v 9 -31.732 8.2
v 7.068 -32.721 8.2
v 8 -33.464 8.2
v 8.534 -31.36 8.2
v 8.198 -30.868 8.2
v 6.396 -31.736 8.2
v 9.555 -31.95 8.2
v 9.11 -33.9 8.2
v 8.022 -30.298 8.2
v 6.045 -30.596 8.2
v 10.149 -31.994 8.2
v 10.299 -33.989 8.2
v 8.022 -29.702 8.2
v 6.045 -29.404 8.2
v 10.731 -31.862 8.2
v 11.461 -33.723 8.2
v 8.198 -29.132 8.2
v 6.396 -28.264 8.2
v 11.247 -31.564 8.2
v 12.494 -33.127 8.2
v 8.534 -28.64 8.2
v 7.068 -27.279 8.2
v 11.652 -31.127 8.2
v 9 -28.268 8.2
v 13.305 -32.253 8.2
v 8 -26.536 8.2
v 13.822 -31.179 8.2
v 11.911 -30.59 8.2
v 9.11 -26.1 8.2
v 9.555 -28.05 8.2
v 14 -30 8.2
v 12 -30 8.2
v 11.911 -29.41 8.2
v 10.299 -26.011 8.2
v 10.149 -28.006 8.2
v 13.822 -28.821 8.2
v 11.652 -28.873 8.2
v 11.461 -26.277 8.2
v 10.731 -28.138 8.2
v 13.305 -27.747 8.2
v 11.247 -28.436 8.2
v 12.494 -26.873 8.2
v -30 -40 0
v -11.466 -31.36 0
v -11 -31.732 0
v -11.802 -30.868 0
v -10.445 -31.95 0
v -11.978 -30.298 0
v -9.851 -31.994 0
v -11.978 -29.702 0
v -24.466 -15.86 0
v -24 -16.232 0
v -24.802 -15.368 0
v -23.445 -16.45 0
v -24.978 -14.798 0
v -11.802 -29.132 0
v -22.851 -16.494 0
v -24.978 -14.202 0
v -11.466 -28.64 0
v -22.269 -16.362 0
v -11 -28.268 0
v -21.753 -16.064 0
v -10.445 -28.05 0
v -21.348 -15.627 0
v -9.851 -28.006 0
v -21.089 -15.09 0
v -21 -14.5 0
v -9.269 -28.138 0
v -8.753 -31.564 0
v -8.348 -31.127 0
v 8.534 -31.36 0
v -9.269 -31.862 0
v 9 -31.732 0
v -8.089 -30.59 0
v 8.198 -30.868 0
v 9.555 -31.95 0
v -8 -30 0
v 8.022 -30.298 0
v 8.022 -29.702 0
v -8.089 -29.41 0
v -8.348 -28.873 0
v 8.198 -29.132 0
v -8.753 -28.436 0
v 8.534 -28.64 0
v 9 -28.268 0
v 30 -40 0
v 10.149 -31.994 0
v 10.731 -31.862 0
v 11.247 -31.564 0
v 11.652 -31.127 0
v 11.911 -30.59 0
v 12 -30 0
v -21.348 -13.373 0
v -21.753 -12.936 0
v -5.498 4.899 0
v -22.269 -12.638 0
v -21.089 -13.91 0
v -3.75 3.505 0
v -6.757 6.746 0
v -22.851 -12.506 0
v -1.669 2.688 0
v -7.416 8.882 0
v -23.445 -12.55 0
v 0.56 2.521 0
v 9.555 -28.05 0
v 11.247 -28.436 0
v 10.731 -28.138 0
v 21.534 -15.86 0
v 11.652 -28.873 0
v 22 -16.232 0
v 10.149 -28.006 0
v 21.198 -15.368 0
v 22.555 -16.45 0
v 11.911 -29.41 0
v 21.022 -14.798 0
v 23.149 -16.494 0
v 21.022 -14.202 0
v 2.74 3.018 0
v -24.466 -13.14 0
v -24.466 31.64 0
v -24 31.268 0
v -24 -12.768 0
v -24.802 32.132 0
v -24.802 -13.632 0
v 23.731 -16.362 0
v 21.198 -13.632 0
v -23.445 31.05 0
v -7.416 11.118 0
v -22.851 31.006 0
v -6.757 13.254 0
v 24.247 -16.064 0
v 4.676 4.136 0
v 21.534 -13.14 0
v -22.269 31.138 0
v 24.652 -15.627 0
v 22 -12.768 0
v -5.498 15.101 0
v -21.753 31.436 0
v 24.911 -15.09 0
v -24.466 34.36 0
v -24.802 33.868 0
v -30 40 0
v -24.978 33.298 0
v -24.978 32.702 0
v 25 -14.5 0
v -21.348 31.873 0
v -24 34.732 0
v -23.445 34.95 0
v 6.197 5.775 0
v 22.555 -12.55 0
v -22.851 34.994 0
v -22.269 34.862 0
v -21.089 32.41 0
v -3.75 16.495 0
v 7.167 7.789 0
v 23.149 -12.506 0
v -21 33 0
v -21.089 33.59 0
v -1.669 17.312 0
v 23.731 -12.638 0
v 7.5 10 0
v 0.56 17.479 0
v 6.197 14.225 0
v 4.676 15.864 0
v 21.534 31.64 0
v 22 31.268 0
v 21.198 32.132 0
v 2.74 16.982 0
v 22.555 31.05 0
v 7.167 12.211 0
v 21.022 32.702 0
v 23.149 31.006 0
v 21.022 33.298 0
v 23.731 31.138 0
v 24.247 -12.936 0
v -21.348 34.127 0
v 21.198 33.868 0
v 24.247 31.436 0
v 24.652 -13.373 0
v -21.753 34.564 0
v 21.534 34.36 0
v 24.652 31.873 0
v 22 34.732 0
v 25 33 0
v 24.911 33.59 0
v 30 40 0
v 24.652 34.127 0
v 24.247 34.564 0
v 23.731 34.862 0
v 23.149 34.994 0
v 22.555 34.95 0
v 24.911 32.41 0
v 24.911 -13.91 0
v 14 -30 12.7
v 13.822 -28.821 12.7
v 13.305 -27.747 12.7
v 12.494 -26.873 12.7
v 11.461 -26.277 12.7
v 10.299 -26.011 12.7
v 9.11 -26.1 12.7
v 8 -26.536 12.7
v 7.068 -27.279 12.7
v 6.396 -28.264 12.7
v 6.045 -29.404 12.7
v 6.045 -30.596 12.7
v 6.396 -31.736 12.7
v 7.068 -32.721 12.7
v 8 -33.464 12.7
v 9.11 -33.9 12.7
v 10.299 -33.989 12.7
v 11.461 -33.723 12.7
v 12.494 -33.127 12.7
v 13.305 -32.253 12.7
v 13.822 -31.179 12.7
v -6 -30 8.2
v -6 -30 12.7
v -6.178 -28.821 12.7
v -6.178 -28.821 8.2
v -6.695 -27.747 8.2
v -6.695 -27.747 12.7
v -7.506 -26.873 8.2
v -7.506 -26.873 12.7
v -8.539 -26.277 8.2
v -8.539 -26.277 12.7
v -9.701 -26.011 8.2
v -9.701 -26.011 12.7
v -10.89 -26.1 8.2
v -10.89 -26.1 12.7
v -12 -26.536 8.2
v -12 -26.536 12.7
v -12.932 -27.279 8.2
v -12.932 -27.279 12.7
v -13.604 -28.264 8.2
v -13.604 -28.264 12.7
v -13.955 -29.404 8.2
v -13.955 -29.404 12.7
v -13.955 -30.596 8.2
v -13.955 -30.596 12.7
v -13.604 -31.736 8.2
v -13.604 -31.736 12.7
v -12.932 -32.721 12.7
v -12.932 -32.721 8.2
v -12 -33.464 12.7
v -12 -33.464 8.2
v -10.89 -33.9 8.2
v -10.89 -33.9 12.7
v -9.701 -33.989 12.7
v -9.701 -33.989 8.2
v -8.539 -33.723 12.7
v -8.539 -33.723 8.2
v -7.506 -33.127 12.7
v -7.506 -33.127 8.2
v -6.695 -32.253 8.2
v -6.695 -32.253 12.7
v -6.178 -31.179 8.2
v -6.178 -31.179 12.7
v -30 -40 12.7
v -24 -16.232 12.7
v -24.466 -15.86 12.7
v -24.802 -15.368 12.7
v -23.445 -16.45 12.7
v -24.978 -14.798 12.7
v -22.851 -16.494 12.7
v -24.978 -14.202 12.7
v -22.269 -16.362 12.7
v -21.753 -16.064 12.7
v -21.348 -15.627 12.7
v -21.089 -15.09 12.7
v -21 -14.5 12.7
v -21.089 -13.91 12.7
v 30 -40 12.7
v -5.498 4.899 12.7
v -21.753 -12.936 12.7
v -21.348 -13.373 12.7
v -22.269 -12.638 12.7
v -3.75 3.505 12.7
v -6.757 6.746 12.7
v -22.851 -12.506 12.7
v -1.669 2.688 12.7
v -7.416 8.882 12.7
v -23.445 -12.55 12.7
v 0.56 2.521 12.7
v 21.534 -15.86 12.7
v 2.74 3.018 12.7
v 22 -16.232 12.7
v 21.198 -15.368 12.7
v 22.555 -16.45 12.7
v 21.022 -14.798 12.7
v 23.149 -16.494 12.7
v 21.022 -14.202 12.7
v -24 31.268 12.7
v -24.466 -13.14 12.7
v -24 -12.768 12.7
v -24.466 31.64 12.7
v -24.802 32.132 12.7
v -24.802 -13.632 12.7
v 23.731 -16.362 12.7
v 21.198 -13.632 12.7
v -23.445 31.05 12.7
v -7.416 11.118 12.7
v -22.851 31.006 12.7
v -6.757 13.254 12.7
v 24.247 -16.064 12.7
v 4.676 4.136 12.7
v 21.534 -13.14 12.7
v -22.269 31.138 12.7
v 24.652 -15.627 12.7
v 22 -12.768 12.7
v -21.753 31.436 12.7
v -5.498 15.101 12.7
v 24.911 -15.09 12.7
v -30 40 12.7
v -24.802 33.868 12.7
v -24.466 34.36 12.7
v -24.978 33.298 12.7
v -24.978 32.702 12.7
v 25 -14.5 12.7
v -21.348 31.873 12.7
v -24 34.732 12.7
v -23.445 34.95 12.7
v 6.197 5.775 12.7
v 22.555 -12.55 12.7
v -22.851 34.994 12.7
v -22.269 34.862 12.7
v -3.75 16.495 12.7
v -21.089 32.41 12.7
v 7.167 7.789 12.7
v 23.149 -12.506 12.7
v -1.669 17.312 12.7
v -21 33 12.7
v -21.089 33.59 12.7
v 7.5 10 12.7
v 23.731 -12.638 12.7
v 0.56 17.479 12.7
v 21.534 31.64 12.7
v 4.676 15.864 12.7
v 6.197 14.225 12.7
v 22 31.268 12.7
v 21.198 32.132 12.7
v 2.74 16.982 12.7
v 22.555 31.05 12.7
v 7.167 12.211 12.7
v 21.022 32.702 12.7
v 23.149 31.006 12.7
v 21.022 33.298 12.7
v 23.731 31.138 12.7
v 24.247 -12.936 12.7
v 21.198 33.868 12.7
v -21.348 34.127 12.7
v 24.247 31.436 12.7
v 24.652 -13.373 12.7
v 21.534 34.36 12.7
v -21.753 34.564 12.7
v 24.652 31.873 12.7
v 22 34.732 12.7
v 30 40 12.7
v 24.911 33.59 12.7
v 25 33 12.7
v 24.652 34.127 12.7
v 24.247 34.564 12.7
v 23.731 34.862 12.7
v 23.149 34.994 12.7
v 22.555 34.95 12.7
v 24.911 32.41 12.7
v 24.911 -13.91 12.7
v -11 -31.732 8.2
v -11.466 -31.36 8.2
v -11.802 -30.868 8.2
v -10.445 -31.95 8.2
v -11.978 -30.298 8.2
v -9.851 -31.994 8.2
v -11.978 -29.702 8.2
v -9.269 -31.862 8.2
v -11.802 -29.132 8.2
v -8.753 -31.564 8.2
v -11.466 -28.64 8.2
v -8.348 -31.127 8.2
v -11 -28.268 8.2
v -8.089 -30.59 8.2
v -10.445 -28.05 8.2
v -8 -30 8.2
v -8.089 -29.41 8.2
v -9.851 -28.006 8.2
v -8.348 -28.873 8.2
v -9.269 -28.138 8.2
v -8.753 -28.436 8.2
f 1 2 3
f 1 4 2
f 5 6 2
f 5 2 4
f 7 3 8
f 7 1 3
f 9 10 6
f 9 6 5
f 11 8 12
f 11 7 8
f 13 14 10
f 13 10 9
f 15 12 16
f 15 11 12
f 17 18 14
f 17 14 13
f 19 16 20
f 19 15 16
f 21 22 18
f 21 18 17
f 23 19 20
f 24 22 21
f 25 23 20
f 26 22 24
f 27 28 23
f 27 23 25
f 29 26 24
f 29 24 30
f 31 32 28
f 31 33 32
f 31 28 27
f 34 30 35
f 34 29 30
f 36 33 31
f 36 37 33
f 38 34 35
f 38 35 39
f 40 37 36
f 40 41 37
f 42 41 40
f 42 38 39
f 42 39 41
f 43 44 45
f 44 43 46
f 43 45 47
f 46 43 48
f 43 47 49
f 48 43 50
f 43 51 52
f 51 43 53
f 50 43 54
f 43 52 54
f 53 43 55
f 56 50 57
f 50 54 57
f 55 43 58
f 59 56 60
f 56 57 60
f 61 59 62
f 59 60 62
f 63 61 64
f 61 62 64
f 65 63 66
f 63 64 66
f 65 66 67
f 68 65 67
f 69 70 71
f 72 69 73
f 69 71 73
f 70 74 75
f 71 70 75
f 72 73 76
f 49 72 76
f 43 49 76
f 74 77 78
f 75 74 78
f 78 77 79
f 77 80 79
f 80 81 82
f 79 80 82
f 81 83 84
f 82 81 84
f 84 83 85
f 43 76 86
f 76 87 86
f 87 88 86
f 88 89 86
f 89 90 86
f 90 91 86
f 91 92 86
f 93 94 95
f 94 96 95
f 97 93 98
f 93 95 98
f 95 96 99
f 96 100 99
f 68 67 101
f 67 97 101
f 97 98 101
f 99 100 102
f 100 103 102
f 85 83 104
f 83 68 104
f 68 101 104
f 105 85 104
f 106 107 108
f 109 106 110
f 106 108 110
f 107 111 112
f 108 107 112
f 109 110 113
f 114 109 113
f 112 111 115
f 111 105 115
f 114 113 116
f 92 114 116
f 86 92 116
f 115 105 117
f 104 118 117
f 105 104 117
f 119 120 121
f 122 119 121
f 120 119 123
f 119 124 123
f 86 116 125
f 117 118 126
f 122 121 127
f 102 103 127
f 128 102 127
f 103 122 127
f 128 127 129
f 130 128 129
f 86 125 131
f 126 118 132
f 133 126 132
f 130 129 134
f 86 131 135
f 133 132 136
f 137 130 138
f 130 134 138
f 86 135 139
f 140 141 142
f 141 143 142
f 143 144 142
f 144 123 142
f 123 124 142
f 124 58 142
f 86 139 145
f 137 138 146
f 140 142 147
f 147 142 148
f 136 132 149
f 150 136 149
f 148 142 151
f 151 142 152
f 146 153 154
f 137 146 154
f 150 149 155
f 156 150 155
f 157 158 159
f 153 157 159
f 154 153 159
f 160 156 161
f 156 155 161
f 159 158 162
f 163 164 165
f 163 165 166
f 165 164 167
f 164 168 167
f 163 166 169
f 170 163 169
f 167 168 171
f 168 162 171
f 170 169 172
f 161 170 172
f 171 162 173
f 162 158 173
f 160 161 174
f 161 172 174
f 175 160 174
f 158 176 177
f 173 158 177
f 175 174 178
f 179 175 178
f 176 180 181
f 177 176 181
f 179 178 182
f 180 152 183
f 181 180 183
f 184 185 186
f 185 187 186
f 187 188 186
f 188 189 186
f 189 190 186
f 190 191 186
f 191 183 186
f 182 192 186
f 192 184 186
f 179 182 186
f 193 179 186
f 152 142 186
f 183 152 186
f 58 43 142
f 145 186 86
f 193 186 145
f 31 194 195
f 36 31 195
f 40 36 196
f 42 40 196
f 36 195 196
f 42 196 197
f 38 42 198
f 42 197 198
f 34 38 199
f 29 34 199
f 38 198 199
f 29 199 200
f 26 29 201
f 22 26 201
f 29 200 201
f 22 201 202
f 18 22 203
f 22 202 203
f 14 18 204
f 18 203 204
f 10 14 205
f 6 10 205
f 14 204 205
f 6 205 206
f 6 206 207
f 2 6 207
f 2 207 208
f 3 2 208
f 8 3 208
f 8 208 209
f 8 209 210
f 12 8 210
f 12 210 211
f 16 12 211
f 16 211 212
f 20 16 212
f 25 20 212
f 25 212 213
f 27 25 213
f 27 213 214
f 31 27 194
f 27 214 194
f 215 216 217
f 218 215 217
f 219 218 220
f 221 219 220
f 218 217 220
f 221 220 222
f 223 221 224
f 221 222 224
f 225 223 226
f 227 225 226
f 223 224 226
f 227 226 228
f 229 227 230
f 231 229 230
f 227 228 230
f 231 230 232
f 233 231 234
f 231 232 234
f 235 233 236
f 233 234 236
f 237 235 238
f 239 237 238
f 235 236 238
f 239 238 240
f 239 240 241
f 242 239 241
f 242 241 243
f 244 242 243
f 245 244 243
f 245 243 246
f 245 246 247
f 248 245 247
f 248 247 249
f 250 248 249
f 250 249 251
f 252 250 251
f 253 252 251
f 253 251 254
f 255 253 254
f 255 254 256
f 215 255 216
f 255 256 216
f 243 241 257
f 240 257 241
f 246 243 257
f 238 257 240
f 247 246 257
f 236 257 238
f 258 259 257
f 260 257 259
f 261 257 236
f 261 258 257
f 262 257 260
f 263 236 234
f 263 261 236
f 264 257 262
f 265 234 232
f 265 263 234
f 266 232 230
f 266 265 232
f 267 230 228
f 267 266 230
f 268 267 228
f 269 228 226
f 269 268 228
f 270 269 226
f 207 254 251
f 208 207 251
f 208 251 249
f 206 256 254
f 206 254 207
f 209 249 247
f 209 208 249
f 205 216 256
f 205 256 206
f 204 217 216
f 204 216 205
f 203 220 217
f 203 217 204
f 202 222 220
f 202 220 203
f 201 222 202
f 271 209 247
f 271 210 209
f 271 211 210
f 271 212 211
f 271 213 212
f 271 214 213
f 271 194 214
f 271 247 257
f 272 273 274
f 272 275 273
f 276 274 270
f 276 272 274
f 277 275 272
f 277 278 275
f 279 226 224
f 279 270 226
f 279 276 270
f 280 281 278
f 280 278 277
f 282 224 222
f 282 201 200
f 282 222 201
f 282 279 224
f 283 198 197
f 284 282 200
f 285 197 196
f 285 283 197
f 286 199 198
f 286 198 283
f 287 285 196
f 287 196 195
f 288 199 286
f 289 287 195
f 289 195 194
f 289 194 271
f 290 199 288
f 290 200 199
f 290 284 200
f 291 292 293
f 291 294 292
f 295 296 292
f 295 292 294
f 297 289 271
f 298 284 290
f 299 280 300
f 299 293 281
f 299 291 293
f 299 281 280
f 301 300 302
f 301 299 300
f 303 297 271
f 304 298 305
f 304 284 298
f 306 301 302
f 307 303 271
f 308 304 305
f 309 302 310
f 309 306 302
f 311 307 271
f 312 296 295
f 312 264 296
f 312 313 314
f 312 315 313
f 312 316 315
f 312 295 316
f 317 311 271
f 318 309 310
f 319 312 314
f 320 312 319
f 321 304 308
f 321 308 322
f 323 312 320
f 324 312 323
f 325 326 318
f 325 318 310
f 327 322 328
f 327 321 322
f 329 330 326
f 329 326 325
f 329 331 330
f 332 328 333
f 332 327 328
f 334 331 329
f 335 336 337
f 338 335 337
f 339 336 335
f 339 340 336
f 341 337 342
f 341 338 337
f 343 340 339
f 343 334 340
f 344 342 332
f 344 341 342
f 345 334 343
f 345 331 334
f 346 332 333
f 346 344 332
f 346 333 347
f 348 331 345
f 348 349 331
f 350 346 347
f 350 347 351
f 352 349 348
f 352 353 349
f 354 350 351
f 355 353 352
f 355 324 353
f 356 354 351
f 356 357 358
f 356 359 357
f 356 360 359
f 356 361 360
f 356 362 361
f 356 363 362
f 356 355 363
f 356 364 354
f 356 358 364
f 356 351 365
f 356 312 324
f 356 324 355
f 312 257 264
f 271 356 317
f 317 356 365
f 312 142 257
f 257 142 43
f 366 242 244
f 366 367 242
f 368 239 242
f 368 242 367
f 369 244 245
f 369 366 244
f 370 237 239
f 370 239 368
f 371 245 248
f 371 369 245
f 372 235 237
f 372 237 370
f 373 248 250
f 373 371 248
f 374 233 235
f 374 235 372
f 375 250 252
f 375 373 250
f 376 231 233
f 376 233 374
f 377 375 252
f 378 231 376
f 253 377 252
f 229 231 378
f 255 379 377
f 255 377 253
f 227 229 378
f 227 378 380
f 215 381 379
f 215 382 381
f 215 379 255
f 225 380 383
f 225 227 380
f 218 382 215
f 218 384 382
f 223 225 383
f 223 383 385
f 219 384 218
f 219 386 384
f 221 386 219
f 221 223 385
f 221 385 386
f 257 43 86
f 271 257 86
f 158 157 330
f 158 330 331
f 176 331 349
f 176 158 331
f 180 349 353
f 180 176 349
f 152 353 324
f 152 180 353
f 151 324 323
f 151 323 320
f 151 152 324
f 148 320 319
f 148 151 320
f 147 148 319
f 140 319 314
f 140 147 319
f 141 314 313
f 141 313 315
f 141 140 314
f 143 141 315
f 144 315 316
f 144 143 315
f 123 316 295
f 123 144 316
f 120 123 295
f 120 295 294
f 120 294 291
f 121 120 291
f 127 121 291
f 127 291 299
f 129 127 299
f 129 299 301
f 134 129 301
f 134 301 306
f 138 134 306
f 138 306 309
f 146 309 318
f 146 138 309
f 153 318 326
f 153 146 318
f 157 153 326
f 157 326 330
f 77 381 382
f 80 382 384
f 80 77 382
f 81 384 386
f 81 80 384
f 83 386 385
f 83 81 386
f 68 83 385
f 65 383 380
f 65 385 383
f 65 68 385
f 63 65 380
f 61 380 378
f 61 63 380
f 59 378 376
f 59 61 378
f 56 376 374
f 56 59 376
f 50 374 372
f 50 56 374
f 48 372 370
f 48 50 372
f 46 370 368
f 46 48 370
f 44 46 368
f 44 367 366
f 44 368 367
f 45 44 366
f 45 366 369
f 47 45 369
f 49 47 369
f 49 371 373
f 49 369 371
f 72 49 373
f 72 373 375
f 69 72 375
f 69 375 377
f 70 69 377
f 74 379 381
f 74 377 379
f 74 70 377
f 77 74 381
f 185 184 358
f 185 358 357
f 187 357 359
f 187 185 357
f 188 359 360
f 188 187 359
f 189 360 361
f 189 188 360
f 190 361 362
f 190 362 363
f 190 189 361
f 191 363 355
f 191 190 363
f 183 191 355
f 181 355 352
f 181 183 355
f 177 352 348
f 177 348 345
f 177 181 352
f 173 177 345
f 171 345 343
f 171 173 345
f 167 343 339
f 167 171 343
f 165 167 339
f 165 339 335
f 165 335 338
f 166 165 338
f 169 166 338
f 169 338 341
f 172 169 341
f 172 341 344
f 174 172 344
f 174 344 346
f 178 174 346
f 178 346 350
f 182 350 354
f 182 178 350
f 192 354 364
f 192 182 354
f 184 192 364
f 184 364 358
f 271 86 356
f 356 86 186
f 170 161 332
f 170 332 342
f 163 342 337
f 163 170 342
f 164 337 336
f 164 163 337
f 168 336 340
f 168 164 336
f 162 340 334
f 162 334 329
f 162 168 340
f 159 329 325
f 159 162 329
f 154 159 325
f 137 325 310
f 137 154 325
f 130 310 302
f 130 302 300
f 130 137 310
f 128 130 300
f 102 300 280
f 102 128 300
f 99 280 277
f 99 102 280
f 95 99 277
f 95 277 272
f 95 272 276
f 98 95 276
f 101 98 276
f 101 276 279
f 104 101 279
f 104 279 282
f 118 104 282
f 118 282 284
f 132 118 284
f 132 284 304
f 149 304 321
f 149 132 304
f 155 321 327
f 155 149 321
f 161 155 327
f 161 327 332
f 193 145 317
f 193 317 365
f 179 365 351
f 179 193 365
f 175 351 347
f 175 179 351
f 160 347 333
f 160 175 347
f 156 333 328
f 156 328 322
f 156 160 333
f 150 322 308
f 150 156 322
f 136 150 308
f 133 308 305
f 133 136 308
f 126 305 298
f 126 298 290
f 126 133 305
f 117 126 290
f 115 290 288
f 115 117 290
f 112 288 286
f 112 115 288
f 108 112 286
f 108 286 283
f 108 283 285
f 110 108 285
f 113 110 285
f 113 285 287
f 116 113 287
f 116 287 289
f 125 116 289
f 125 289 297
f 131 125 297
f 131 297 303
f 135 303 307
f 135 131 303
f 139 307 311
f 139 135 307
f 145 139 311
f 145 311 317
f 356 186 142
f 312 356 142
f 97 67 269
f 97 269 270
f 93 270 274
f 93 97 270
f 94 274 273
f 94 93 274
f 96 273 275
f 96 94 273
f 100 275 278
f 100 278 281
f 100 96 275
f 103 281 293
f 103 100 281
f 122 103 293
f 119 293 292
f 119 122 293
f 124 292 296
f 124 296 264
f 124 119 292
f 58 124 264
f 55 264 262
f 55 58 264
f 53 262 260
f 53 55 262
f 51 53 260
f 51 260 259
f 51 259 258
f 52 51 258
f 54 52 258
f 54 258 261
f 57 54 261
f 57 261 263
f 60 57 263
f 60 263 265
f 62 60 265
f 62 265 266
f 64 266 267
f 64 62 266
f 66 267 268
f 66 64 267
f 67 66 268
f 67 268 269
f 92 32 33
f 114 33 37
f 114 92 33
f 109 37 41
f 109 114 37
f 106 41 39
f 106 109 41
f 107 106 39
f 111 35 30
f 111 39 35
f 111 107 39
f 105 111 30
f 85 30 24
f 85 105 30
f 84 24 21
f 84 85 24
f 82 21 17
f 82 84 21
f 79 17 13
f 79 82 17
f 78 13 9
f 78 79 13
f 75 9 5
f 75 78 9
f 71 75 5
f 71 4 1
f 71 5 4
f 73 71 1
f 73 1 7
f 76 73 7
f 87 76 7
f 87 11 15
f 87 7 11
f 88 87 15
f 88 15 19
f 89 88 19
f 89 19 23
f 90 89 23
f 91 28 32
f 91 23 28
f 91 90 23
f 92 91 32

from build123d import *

# Parameters (mm, degrees)
CROQUIS1_W              = 51
CROQUIS1_H              = 80
CROQUIS1_R              = 2
CROQUIS1_R_2            = 7.5
SALIENTE_EXTRUIR1_DEPTH = 12.7
CROQUIS2_R              = 4
CORTAR_EXTRUIR1_DEPTH   = 4.5


with BuildPart() as part:
    # Croquis1 → Saliente-Extruir1 (new body)
    # profile 1 of 5: a face of its own
    with BuildSketch(Plane.XY):
        with BuildLine():
            ThreePointArc((-28.5, 37), (-27.621320344, 39.121320344), (-25.5, 40))
            Line((-25.5, 40), (-30, 40))
            Line((-30, 40), (-30, -40))
            Line((-30, -40), (-28.5, -40))
            Line((-28.5, -40), (-28.5, 37))
        make_face()
    # profile 2 of 5: a face of its own
    with BuildSketch(Plane.XY):
        with BuildLine():
            Line((-25.5, -40), (-25.5, 40))
            ThreePointArc((-25.5, 40), (-27.621320344, 39.121320344), (-28.5, 37))
            Line((-28.5, 37), (-28.5, -40))
            Line((-28.5, -40), (-25.5, -40))
        make_face()
    # profile 3 of 5: a face of its own
    with BuildSketch(Plane.XY):
        Rectangle(CROQUIS1_W, CROQUIS1_H)
        with Locations((-10, -30)):
            Circle(CROQUIS1_R, mode=Mode.SUBTRACT)
        with Locations((-23, -14.5)):
            Circle(CROQUIS1_R, mode=Mode.SUBTRACT)
        with Locations((10, -30)):
            Circle(CROQUIS1_R, mode=Mode.SUBTRACT)
        with Locations((23, -14.5)):
            Circle(CROQUIS1_R, mode=Mode.SUBTRACT)
        with Locations((-23, 33)):
            Circle(CROQUIS1_R, mode=Mode.SUBTRACT)
        with Locations((0, 10)):
            Circle(CROQUIS1_R_2, mode=Mode.SUBTRACT)
        with Locations((23, 33)):
            Circle(CROQUIS1_R, mode=Mode.SUBTRACT)
    # profile 4 of 5: a face of its own
    with BuildSketch(Plane.XY):
        with BuildLine():
            ThreePointArc((28.5, 37), (27.621320344, 39.121320344), (25.5, 40))
            Line((25.5, 40), (25.5, -40))
            Line((25.5, -40), (28.5, -40))
            Line((28.5, -40), (28.5, 37))
        make_face()
    # profile 5 of 5: a face of its own
    with BuildSketch(Plane.XY):
        with BuildLine():
            Line((30, 40), (25.5, 40))
            ThreePointArc((25.5, 40), (27.621320344, 39.121320344), (28.5, 37))
            Line((28.5, 37), (28.5, -40))
            Line((28.5, -40), (30, -40))
            Line((30, -40), (30, 40))
        make_face()
    extrude(amount=SALIENTE_EXTRUIR1_DEPTH)

    # Croquis2 → Cortar-Extruir1 (cut)
    with BuildSketch(Plane.XY.offset(12.7)):
        with Locations((-10, -30)):
            Circle(CROQUIS2_R)
        with Locations((10, -30)):
            Circle(CROQUIS2_R)
    extrude(amount=-CORTAR_EXTRUIR1_DEPTH, mode=Mode.SUBTRACT)


solid = part.part
